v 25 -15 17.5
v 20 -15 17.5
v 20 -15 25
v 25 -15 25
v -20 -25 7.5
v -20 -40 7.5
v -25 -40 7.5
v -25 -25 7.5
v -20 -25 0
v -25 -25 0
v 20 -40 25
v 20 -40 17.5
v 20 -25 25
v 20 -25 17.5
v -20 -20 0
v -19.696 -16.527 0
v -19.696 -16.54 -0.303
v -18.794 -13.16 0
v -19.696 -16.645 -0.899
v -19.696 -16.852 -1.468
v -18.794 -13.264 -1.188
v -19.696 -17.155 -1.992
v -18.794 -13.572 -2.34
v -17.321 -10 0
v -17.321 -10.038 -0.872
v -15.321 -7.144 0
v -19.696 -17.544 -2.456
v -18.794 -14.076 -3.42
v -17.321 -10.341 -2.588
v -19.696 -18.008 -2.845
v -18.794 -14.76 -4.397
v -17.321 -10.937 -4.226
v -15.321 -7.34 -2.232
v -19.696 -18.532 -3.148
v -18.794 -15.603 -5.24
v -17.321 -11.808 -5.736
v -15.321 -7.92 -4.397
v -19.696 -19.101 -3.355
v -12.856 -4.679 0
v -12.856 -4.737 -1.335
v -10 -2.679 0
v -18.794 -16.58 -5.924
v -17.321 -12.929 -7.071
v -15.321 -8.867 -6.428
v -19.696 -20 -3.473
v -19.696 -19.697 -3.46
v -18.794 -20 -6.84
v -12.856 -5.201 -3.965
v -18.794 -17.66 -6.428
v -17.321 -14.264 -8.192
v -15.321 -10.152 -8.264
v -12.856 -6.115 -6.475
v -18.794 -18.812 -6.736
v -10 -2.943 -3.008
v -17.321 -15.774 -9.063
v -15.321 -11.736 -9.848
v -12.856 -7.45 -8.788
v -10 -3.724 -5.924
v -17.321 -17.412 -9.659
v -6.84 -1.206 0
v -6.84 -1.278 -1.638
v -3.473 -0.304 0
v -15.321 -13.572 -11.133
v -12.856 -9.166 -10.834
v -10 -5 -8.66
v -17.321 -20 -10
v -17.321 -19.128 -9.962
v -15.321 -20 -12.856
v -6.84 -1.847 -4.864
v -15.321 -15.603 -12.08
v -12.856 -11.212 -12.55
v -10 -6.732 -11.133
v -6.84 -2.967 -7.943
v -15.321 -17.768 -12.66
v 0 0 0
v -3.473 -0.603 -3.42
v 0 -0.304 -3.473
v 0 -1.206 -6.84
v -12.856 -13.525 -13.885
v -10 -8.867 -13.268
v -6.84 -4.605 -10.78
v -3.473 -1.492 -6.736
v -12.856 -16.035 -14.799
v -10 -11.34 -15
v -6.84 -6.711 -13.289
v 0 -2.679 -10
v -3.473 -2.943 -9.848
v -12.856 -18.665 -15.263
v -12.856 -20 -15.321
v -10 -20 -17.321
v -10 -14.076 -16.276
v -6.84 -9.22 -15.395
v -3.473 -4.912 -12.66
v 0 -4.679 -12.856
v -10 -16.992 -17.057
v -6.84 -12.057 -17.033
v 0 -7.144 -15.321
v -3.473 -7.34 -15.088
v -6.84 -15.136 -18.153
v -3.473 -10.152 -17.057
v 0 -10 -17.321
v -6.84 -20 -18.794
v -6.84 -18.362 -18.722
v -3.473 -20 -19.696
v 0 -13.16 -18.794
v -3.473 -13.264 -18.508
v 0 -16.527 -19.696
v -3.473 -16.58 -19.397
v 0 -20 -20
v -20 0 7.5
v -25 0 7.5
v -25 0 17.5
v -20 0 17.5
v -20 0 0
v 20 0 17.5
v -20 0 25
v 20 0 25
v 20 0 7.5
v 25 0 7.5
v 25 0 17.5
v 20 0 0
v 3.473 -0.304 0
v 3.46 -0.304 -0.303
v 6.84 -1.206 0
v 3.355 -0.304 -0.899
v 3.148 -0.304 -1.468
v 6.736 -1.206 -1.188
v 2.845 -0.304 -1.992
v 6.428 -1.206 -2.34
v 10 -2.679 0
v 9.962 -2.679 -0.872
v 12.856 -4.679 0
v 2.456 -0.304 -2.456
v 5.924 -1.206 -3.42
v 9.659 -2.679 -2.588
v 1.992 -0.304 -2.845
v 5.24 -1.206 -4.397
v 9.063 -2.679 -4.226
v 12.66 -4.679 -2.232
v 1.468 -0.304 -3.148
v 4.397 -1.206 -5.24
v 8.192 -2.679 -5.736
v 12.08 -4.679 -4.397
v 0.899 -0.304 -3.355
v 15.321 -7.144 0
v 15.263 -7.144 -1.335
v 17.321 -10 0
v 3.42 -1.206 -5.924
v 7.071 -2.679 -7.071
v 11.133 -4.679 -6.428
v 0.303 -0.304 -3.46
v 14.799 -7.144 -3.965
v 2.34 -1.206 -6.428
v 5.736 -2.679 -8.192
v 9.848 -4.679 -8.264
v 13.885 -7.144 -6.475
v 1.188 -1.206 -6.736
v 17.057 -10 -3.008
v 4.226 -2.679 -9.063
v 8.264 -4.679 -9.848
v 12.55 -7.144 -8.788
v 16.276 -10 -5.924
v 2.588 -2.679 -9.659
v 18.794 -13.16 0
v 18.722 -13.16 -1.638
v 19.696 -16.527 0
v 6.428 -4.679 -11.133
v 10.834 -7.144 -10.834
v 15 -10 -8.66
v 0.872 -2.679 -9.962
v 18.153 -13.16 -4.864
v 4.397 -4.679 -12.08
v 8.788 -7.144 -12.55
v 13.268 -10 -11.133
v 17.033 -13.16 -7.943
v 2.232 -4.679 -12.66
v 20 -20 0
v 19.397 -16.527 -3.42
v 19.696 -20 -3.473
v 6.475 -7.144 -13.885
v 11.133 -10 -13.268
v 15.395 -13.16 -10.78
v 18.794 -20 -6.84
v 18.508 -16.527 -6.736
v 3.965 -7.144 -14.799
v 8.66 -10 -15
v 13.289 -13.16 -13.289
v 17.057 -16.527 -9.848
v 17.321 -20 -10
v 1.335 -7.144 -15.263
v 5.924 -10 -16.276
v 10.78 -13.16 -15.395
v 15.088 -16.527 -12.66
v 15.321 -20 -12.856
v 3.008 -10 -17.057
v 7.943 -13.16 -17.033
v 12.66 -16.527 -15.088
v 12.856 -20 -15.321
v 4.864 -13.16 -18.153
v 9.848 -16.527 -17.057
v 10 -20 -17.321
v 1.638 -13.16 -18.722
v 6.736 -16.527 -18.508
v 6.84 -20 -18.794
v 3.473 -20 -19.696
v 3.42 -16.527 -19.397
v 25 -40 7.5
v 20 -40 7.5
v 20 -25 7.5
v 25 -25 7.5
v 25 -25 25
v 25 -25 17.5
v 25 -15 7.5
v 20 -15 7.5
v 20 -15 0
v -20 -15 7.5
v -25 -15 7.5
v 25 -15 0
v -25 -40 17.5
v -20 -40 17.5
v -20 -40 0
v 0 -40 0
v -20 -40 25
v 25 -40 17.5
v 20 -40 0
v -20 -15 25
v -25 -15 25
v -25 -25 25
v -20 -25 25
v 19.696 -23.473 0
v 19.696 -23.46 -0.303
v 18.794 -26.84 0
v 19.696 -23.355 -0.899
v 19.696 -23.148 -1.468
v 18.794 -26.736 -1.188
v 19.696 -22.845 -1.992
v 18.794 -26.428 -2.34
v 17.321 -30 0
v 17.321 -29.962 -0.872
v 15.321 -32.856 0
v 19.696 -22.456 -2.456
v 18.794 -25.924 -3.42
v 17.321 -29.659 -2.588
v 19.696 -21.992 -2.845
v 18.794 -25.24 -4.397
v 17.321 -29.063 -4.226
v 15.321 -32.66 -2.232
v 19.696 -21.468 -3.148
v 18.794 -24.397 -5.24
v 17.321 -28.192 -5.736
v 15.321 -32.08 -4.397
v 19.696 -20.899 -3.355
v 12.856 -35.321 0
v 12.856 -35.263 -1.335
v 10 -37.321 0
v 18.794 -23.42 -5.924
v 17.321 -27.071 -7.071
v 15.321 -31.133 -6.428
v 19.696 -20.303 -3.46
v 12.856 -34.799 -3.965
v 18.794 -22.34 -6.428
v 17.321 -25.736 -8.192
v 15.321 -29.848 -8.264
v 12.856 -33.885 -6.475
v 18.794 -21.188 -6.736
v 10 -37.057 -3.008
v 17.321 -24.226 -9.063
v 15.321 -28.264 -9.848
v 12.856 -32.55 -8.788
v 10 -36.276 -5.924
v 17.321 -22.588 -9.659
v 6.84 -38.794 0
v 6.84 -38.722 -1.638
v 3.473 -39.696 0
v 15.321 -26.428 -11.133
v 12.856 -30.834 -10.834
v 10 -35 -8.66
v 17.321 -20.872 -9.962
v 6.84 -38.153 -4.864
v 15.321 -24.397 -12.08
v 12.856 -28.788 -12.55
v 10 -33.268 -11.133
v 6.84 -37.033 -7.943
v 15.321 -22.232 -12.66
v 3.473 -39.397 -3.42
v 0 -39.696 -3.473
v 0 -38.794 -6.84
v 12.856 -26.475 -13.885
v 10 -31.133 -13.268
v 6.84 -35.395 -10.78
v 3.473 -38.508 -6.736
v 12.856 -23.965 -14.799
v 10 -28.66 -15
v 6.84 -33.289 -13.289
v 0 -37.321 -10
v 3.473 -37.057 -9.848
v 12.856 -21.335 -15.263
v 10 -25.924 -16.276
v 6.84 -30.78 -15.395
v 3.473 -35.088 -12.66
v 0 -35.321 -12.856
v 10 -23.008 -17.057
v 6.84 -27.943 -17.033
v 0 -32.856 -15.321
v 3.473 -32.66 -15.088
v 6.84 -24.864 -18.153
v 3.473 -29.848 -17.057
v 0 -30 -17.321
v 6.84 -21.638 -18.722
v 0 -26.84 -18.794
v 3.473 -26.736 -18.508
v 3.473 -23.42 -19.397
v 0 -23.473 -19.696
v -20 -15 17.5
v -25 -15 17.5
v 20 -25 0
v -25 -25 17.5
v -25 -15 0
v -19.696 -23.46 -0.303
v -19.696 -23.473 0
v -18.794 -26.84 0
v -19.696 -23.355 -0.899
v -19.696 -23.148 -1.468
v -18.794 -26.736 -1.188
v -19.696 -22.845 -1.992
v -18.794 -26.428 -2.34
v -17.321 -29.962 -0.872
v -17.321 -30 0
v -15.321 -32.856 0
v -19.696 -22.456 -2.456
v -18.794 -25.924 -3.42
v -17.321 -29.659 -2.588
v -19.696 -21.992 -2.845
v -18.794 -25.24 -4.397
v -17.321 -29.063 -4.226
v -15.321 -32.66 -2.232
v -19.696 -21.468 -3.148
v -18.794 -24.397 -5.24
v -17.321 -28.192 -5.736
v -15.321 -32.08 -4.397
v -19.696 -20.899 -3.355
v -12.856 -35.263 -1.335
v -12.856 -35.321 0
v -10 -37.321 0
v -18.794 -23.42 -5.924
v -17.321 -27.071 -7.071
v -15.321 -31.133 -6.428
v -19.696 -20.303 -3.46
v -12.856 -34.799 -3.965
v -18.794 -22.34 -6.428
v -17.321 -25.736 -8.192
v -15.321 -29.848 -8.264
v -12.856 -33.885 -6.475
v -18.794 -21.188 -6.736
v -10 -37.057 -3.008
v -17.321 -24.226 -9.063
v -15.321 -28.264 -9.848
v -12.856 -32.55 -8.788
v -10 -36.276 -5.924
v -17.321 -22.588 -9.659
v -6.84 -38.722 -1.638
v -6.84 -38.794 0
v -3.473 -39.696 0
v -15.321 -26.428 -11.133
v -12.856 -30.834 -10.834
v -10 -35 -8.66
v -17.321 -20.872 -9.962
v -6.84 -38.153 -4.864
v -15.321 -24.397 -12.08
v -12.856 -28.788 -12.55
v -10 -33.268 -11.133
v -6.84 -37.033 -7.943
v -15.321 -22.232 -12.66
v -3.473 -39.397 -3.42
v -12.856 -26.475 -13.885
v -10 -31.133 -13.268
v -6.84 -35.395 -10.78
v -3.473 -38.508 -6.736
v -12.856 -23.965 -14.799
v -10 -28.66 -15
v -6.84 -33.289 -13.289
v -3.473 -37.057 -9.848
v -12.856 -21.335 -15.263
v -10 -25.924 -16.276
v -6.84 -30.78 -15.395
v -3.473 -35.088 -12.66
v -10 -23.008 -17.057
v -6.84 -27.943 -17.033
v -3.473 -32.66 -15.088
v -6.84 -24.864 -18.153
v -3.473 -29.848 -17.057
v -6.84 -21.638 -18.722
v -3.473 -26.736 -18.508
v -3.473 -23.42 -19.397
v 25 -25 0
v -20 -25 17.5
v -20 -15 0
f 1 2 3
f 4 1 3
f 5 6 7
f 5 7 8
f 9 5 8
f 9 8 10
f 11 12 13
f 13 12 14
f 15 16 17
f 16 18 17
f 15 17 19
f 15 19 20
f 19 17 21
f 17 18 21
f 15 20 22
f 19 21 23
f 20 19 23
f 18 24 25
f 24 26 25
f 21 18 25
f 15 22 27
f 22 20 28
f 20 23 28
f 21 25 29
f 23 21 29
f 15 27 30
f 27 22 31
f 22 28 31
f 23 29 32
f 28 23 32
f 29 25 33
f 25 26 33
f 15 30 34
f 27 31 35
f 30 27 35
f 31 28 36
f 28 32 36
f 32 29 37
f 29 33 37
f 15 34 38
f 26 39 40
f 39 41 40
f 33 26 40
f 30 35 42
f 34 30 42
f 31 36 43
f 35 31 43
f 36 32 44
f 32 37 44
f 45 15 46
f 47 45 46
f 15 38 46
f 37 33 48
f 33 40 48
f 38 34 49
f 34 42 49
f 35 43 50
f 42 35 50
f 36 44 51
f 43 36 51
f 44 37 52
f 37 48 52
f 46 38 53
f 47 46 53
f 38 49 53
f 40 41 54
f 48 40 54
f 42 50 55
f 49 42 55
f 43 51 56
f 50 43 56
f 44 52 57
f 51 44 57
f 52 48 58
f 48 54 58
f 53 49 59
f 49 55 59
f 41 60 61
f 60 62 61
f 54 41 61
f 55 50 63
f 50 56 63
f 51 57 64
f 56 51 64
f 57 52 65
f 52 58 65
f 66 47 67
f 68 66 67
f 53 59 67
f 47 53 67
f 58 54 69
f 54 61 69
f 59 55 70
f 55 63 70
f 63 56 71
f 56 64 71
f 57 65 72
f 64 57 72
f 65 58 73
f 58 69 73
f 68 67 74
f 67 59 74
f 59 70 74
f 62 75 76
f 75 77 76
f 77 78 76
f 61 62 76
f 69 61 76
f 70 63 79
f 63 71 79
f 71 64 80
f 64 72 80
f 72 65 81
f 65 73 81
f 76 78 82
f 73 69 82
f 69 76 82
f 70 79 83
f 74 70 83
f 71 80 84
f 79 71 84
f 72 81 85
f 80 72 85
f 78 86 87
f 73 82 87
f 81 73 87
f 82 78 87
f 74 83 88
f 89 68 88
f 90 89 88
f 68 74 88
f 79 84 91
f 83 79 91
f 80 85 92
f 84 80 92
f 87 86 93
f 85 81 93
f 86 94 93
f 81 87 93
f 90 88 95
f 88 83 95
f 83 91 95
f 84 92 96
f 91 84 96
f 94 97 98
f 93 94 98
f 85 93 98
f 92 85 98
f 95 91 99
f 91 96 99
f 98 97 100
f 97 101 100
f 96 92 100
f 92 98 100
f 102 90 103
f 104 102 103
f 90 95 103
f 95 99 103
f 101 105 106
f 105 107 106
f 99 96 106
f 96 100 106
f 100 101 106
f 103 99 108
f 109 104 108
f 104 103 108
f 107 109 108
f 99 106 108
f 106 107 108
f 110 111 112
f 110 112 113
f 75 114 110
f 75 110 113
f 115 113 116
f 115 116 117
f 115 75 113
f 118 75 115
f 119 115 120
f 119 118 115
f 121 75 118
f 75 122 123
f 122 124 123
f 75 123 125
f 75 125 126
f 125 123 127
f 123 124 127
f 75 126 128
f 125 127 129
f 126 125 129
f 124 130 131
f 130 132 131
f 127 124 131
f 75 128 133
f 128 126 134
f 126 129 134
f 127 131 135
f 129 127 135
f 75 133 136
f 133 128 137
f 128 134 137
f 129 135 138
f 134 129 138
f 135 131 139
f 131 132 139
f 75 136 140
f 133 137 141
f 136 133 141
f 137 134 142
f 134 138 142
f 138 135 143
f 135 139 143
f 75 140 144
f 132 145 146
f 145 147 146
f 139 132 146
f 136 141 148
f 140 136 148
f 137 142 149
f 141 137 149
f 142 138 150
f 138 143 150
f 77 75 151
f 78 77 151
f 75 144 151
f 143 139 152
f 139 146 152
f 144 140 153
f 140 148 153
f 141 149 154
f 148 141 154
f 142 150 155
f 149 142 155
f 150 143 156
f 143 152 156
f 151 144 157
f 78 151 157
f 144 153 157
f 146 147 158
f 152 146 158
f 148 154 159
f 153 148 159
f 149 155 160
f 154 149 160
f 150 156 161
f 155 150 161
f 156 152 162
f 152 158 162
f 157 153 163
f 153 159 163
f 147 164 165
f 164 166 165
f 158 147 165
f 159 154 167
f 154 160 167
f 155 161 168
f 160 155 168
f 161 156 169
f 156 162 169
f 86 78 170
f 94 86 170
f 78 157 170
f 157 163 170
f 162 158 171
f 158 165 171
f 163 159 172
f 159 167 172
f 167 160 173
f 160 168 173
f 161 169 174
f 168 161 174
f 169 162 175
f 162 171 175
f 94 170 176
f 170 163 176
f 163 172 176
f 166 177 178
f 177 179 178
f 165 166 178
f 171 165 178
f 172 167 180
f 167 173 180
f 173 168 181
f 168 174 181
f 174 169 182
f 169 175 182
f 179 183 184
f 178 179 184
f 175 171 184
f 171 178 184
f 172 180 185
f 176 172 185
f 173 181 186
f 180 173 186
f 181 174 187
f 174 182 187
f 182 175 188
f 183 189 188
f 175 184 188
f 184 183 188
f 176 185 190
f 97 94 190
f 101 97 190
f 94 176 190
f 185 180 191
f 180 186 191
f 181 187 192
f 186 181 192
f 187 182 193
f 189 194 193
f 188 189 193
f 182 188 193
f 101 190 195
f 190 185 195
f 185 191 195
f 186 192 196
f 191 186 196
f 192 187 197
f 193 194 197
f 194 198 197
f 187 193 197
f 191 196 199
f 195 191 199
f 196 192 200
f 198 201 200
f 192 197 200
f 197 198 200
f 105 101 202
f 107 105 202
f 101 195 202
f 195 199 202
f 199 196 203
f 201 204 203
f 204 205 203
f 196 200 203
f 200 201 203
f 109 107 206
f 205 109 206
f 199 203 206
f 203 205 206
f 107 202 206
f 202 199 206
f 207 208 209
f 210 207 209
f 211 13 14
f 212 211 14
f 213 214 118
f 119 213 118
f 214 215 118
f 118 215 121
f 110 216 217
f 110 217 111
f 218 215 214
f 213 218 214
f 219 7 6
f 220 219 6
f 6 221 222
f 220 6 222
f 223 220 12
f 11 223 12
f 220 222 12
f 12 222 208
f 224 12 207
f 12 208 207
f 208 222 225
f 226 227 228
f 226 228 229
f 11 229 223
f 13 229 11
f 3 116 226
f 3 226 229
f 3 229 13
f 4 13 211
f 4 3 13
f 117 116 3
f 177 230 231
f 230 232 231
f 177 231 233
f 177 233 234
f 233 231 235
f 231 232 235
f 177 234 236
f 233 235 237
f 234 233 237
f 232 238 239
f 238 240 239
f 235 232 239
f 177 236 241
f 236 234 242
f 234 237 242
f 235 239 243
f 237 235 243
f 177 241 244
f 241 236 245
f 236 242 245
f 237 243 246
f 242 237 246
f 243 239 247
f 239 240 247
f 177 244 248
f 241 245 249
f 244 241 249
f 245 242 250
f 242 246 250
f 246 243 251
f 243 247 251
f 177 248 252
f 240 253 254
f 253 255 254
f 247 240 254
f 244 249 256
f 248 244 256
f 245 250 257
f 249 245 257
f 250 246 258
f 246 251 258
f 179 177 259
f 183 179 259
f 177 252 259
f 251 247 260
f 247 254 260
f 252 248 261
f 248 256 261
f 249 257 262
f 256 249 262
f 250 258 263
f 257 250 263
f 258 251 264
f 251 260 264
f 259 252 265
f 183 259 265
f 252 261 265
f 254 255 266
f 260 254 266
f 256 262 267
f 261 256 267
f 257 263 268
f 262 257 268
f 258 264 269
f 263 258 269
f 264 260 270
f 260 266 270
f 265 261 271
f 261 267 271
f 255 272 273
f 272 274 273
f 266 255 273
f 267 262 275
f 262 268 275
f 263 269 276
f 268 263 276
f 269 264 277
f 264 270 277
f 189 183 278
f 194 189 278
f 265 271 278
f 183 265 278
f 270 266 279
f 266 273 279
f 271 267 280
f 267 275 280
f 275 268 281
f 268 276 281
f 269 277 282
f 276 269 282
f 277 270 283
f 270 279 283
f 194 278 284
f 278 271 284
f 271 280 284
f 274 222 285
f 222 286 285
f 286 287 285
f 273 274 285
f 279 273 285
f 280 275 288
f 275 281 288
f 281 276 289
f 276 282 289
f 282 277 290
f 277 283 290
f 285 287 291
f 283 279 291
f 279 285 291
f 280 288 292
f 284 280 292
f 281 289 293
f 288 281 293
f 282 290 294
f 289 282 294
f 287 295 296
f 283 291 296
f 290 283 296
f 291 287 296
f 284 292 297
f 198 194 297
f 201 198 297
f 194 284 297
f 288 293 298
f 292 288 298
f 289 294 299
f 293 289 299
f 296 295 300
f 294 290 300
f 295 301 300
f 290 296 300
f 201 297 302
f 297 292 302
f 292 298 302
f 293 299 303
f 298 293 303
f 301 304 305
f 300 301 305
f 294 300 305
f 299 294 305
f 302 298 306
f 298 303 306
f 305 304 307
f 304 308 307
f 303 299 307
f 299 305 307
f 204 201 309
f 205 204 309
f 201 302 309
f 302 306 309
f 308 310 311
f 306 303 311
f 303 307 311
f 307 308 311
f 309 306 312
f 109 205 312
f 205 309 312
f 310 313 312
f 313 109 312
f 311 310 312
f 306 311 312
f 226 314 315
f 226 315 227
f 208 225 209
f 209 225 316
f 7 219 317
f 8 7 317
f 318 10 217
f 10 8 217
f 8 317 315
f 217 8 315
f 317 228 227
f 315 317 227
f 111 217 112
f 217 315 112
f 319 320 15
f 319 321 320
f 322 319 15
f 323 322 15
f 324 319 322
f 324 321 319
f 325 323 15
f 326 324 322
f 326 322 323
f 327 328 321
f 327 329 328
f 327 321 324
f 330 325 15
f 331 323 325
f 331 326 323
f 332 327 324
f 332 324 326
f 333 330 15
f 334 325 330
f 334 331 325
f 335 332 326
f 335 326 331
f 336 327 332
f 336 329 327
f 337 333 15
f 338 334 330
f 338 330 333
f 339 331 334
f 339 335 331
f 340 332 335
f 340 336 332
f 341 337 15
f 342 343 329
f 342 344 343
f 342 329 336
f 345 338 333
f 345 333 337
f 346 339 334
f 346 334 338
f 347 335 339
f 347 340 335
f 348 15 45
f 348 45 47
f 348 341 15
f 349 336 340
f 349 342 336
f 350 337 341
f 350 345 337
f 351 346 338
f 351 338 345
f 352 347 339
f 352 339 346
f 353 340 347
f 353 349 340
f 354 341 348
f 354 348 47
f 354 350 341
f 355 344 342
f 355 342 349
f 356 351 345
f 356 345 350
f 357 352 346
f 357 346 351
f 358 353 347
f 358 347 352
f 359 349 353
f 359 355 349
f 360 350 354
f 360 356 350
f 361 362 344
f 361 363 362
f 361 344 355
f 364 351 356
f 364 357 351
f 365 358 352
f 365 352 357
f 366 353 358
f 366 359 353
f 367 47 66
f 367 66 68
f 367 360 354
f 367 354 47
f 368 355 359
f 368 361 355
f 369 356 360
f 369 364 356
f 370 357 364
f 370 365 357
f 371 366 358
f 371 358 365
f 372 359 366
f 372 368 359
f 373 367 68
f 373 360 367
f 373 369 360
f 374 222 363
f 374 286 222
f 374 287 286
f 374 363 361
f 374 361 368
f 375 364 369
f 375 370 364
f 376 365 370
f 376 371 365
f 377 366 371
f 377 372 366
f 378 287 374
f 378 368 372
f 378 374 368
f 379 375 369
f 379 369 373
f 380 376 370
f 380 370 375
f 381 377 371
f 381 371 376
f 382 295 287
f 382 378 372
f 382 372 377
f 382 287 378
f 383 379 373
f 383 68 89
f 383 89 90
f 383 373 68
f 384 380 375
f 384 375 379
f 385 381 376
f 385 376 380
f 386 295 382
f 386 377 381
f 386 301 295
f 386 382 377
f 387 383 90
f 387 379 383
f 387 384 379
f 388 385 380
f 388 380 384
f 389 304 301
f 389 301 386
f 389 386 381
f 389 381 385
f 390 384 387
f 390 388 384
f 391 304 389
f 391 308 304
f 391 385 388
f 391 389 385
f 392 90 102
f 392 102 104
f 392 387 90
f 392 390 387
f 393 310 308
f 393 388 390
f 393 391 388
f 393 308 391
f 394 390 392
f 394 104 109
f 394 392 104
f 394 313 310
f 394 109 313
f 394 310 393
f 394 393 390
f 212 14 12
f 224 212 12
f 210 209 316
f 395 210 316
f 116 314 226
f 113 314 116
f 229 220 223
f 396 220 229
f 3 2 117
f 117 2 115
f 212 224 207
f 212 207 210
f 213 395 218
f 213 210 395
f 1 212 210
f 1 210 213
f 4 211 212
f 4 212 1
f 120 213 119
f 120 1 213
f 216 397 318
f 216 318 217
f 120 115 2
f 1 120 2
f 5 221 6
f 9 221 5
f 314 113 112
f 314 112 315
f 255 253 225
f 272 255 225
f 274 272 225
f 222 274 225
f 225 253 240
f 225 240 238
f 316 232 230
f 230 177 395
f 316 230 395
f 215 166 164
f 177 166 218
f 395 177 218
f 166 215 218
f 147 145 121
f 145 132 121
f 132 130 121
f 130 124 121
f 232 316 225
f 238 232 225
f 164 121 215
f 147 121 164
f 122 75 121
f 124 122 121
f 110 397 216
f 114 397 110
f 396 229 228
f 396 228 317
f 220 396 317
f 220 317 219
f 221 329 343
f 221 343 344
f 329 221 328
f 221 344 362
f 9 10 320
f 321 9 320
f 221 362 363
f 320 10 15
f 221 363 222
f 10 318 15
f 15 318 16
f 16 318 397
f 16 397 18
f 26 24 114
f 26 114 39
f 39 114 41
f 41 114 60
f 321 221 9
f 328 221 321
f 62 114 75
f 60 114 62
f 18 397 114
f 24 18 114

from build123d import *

# Parameters (mm, degrees)
F0_W     = 40
F0_H     = 40
F1_DEPTH = 40
F2_R     = 19.99999
F3_W     = 40
F3_H     = 40
F4_DEPTH = 25
F6_DEPTH = 25
F7_DEPTH = 50


# Not quite as in the source:
# - a fillet or chamfer is up to 0.001 mm smaller than in the source, because OpenCascade refuses the exact size


with BuildPart() as f1:
    # F0 (on Front) → F1 (new body)
    with BuildSketch(Plane.XZ):
        Rectangle(F0_W, F0_H)
    extrude(amount=F1_DEPTH)

    # F2 (radius 20 in the source; OpenCascade refuses exactly that, so slightly less here)
    f2_edges = [f1.edges().sort_by_distance(p)[0] for p in [
        (20, -20, 20),
        (-20, -20, 20),
        (0, 0, 20),
        (0, -40, 20),
        (0, -40, -20),
        (20, -40, 0),
        (-20, -40, 0),
        (20, -20, -20),
        (20, 0, 0),
        (0, 0, -20),
        (-20, 0, 0),
        (-20, -20, -20),
    ]]
    fillet(f2_edges, radius=F2_R)

    # F3 (on Top) → F4 (join)
    with BuildSketch(Plane.XY):
        with Locations((0, -20)):
            Rectangle(F3_W, F3_H)
    extrude(amount=F4_DEPTH)

    # F5 (on Right) → F6 (join)
    with BuildSketch(Plane.YZ):
        Polygon((-25, 0), (-20, 0), (-15, 0), (-15, 7.5), (0, 7.5), (0, 17.5), (-15, 17.5), (-15, 25), (-25, 25), (-25, 17.5), (-40, 17.5), (-40, 7.5), (-25, 7.5), align=None)
    extrude(amount=F6_DEPTH)

    # F7 (add): a face of the model
    f7_faces = [f1.faces().sort_by_distance(p)[0] for p in [
        (25, -20, 12.5),
    ]]
    extrude(f7_faces, amount=-F7_DEPTH)


solid = f1.part
